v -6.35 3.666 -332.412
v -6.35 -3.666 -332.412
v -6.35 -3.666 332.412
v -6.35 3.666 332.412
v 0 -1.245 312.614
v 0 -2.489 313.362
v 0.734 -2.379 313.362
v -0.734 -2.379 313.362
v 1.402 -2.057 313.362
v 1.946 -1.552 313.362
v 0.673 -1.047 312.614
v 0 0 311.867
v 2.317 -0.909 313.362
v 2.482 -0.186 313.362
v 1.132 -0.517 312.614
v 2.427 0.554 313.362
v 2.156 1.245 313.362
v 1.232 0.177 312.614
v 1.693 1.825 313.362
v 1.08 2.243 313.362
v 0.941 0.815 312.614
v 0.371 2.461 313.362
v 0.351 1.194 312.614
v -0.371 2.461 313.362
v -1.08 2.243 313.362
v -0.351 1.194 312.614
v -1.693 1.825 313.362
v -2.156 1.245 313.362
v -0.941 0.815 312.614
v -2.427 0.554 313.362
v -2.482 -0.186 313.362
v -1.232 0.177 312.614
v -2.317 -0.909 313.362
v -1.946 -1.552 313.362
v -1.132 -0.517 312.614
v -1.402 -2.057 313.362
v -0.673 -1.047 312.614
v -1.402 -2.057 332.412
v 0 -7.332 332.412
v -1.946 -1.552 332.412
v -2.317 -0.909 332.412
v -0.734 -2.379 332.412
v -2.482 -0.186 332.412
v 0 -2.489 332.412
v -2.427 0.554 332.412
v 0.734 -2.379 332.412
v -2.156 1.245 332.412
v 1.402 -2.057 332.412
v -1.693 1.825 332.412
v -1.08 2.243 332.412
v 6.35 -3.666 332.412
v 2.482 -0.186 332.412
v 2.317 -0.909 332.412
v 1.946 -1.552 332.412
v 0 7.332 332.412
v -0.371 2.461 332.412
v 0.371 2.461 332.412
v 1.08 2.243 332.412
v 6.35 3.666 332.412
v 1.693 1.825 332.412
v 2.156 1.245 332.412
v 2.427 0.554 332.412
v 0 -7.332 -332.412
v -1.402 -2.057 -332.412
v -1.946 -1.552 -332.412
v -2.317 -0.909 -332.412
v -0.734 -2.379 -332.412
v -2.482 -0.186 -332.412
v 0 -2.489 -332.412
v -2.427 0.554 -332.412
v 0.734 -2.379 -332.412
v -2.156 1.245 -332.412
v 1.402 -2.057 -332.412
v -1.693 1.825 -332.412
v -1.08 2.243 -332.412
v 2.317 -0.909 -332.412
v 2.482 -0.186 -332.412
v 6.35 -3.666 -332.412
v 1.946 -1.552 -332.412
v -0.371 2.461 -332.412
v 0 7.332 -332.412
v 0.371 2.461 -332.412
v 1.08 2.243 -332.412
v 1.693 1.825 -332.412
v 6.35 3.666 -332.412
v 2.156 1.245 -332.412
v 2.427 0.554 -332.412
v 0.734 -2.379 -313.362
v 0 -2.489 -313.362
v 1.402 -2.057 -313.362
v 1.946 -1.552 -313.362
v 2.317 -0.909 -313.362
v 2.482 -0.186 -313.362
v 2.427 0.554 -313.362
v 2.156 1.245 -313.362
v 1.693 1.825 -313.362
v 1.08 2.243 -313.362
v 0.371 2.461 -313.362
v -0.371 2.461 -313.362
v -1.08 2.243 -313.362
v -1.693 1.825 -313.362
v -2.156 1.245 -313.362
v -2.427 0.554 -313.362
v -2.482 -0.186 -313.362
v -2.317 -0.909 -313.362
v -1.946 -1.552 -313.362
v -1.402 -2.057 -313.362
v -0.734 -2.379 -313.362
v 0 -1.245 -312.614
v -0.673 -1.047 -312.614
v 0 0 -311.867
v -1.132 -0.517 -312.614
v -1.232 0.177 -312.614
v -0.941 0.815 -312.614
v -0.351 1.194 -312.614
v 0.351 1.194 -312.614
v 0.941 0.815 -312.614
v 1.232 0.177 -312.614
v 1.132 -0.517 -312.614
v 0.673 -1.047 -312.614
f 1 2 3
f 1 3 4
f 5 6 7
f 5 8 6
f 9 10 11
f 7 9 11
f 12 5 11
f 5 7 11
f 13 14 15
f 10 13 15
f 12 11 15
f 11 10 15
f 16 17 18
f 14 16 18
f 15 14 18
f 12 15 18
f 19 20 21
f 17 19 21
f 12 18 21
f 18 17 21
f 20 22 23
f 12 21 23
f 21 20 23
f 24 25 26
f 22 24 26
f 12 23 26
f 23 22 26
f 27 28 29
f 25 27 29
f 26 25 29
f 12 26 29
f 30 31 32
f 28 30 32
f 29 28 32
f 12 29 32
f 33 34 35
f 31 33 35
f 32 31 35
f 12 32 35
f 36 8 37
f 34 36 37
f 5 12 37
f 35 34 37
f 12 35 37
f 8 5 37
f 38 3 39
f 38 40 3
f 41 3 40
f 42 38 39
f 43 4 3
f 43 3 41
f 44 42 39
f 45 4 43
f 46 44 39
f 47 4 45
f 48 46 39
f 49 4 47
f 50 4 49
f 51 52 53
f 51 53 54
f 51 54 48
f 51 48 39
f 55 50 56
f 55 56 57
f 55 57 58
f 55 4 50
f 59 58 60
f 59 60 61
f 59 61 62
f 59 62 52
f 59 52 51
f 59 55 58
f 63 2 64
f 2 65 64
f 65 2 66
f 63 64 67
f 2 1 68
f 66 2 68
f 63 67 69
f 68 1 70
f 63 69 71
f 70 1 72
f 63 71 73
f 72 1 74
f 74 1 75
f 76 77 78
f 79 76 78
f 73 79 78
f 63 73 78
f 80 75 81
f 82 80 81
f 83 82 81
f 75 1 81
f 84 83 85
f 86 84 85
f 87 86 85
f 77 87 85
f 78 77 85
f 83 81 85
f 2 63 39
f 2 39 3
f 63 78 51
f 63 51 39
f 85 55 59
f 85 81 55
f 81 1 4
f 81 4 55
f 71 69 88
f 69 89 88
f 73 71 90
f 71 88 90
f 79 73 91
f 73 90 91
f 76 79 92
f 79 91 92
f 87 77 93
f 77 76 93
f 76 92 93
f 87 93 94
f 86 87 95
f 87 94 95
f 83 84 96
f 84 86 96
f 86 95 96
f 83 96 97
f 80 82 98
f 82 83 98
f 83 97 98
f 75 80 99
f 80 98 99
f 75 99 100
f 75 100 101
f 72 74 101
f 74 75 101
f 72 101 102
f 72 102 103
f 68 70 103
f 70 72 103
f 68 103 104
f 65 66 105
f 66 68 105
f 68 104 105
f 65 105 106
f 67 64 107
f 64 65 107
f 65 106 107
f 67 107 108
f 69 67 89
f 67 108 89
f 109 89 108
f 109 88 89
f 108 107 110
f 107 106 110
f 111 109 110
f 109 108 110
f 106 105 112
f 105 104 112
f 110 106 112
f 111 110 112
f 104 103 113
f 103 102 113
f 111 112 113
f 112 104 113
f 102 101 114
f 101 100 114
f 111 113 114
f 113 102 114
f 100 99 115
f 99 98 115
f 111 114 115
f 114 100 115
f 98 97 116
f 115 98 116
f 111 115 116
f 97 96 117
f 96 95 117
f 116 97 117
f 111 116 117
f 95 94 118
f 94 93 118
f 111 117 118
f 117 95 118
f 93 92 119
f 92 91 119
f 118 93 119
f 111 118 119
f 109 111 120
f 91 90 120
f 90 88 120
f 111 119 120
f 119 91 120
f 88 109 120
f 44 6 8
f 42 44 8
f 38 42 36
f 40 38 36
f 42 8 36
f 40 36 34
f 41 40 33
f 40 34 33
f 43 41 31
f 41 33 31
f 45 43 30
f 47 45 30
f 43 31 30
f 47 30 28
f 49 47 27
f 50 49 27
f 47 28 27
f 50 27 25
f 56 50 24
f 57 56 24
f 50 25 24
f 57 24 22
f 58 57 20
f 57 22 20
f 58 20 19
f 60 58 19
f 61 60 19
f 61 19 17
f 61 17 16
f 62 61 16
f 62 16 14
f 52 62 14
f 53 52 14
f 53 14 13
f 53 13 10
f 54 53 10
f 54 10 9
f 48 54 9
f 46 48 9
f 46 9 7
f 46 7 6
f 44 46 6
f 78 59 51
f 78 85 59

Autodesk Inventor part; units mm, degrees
ref_plane "YZ Plane" through (0, 0, 0) normal (1, 0, 0) x (0, 1, 0)
ref_plane "XZ Plane" through (0, 0, 0) normal (0, 1, 0) x (-1, 0, 0)
ref_plane "XY Plane" through (0, 0, 0) normal (0, 0, 1) x (1, 0, 0)
sketch "Sketch1" plane through (0, 0, 0) normal (0, 0, 1) x (1, 0, 0)
  line L0 (0, 7.3323) -> (6.35, 3.6662)
  line L1 (6.35, 3.6662) -> (6.35, -3.6662)
  line L2 (6.35, -3.6662) -> (0, -7.3323)
  line L3 (0, -7.3323) -> (-6.35, -3.6662)
  line L4 (-6.35, -3.6662) -> (-6.35, 3.6662)
  line L5 (-6.35, 3.6662) -> (0, 7.3323)
  point P0 (0, 0)
  point P1 (0, 0)
  dimension "d1" = 12.7
extrude "Extrusion1" add sketch "Sketch1" along normal mid plane 664.8247
sketch "Sketch2" plane through (0, 0, 332.4123) normal (0, 0, 1) x (1, 0, 0)
  point P0 (0, 0)
hole "Hole1" at (0, 0, 332.4123) direction (0, 0, -1) diameter 4.9784 depth 19.05 tip angle 118 thread size "1/4-20 UNC" class "2B" standard "ANSI Unified Screw Threads"
mirror "Mirror1" about plane through (0, 0, 0) normal (0, 0, 1) of "Hole1"
properties part number "0.5_Jack_Shaft" material "Aluminum, 6061-T6"
